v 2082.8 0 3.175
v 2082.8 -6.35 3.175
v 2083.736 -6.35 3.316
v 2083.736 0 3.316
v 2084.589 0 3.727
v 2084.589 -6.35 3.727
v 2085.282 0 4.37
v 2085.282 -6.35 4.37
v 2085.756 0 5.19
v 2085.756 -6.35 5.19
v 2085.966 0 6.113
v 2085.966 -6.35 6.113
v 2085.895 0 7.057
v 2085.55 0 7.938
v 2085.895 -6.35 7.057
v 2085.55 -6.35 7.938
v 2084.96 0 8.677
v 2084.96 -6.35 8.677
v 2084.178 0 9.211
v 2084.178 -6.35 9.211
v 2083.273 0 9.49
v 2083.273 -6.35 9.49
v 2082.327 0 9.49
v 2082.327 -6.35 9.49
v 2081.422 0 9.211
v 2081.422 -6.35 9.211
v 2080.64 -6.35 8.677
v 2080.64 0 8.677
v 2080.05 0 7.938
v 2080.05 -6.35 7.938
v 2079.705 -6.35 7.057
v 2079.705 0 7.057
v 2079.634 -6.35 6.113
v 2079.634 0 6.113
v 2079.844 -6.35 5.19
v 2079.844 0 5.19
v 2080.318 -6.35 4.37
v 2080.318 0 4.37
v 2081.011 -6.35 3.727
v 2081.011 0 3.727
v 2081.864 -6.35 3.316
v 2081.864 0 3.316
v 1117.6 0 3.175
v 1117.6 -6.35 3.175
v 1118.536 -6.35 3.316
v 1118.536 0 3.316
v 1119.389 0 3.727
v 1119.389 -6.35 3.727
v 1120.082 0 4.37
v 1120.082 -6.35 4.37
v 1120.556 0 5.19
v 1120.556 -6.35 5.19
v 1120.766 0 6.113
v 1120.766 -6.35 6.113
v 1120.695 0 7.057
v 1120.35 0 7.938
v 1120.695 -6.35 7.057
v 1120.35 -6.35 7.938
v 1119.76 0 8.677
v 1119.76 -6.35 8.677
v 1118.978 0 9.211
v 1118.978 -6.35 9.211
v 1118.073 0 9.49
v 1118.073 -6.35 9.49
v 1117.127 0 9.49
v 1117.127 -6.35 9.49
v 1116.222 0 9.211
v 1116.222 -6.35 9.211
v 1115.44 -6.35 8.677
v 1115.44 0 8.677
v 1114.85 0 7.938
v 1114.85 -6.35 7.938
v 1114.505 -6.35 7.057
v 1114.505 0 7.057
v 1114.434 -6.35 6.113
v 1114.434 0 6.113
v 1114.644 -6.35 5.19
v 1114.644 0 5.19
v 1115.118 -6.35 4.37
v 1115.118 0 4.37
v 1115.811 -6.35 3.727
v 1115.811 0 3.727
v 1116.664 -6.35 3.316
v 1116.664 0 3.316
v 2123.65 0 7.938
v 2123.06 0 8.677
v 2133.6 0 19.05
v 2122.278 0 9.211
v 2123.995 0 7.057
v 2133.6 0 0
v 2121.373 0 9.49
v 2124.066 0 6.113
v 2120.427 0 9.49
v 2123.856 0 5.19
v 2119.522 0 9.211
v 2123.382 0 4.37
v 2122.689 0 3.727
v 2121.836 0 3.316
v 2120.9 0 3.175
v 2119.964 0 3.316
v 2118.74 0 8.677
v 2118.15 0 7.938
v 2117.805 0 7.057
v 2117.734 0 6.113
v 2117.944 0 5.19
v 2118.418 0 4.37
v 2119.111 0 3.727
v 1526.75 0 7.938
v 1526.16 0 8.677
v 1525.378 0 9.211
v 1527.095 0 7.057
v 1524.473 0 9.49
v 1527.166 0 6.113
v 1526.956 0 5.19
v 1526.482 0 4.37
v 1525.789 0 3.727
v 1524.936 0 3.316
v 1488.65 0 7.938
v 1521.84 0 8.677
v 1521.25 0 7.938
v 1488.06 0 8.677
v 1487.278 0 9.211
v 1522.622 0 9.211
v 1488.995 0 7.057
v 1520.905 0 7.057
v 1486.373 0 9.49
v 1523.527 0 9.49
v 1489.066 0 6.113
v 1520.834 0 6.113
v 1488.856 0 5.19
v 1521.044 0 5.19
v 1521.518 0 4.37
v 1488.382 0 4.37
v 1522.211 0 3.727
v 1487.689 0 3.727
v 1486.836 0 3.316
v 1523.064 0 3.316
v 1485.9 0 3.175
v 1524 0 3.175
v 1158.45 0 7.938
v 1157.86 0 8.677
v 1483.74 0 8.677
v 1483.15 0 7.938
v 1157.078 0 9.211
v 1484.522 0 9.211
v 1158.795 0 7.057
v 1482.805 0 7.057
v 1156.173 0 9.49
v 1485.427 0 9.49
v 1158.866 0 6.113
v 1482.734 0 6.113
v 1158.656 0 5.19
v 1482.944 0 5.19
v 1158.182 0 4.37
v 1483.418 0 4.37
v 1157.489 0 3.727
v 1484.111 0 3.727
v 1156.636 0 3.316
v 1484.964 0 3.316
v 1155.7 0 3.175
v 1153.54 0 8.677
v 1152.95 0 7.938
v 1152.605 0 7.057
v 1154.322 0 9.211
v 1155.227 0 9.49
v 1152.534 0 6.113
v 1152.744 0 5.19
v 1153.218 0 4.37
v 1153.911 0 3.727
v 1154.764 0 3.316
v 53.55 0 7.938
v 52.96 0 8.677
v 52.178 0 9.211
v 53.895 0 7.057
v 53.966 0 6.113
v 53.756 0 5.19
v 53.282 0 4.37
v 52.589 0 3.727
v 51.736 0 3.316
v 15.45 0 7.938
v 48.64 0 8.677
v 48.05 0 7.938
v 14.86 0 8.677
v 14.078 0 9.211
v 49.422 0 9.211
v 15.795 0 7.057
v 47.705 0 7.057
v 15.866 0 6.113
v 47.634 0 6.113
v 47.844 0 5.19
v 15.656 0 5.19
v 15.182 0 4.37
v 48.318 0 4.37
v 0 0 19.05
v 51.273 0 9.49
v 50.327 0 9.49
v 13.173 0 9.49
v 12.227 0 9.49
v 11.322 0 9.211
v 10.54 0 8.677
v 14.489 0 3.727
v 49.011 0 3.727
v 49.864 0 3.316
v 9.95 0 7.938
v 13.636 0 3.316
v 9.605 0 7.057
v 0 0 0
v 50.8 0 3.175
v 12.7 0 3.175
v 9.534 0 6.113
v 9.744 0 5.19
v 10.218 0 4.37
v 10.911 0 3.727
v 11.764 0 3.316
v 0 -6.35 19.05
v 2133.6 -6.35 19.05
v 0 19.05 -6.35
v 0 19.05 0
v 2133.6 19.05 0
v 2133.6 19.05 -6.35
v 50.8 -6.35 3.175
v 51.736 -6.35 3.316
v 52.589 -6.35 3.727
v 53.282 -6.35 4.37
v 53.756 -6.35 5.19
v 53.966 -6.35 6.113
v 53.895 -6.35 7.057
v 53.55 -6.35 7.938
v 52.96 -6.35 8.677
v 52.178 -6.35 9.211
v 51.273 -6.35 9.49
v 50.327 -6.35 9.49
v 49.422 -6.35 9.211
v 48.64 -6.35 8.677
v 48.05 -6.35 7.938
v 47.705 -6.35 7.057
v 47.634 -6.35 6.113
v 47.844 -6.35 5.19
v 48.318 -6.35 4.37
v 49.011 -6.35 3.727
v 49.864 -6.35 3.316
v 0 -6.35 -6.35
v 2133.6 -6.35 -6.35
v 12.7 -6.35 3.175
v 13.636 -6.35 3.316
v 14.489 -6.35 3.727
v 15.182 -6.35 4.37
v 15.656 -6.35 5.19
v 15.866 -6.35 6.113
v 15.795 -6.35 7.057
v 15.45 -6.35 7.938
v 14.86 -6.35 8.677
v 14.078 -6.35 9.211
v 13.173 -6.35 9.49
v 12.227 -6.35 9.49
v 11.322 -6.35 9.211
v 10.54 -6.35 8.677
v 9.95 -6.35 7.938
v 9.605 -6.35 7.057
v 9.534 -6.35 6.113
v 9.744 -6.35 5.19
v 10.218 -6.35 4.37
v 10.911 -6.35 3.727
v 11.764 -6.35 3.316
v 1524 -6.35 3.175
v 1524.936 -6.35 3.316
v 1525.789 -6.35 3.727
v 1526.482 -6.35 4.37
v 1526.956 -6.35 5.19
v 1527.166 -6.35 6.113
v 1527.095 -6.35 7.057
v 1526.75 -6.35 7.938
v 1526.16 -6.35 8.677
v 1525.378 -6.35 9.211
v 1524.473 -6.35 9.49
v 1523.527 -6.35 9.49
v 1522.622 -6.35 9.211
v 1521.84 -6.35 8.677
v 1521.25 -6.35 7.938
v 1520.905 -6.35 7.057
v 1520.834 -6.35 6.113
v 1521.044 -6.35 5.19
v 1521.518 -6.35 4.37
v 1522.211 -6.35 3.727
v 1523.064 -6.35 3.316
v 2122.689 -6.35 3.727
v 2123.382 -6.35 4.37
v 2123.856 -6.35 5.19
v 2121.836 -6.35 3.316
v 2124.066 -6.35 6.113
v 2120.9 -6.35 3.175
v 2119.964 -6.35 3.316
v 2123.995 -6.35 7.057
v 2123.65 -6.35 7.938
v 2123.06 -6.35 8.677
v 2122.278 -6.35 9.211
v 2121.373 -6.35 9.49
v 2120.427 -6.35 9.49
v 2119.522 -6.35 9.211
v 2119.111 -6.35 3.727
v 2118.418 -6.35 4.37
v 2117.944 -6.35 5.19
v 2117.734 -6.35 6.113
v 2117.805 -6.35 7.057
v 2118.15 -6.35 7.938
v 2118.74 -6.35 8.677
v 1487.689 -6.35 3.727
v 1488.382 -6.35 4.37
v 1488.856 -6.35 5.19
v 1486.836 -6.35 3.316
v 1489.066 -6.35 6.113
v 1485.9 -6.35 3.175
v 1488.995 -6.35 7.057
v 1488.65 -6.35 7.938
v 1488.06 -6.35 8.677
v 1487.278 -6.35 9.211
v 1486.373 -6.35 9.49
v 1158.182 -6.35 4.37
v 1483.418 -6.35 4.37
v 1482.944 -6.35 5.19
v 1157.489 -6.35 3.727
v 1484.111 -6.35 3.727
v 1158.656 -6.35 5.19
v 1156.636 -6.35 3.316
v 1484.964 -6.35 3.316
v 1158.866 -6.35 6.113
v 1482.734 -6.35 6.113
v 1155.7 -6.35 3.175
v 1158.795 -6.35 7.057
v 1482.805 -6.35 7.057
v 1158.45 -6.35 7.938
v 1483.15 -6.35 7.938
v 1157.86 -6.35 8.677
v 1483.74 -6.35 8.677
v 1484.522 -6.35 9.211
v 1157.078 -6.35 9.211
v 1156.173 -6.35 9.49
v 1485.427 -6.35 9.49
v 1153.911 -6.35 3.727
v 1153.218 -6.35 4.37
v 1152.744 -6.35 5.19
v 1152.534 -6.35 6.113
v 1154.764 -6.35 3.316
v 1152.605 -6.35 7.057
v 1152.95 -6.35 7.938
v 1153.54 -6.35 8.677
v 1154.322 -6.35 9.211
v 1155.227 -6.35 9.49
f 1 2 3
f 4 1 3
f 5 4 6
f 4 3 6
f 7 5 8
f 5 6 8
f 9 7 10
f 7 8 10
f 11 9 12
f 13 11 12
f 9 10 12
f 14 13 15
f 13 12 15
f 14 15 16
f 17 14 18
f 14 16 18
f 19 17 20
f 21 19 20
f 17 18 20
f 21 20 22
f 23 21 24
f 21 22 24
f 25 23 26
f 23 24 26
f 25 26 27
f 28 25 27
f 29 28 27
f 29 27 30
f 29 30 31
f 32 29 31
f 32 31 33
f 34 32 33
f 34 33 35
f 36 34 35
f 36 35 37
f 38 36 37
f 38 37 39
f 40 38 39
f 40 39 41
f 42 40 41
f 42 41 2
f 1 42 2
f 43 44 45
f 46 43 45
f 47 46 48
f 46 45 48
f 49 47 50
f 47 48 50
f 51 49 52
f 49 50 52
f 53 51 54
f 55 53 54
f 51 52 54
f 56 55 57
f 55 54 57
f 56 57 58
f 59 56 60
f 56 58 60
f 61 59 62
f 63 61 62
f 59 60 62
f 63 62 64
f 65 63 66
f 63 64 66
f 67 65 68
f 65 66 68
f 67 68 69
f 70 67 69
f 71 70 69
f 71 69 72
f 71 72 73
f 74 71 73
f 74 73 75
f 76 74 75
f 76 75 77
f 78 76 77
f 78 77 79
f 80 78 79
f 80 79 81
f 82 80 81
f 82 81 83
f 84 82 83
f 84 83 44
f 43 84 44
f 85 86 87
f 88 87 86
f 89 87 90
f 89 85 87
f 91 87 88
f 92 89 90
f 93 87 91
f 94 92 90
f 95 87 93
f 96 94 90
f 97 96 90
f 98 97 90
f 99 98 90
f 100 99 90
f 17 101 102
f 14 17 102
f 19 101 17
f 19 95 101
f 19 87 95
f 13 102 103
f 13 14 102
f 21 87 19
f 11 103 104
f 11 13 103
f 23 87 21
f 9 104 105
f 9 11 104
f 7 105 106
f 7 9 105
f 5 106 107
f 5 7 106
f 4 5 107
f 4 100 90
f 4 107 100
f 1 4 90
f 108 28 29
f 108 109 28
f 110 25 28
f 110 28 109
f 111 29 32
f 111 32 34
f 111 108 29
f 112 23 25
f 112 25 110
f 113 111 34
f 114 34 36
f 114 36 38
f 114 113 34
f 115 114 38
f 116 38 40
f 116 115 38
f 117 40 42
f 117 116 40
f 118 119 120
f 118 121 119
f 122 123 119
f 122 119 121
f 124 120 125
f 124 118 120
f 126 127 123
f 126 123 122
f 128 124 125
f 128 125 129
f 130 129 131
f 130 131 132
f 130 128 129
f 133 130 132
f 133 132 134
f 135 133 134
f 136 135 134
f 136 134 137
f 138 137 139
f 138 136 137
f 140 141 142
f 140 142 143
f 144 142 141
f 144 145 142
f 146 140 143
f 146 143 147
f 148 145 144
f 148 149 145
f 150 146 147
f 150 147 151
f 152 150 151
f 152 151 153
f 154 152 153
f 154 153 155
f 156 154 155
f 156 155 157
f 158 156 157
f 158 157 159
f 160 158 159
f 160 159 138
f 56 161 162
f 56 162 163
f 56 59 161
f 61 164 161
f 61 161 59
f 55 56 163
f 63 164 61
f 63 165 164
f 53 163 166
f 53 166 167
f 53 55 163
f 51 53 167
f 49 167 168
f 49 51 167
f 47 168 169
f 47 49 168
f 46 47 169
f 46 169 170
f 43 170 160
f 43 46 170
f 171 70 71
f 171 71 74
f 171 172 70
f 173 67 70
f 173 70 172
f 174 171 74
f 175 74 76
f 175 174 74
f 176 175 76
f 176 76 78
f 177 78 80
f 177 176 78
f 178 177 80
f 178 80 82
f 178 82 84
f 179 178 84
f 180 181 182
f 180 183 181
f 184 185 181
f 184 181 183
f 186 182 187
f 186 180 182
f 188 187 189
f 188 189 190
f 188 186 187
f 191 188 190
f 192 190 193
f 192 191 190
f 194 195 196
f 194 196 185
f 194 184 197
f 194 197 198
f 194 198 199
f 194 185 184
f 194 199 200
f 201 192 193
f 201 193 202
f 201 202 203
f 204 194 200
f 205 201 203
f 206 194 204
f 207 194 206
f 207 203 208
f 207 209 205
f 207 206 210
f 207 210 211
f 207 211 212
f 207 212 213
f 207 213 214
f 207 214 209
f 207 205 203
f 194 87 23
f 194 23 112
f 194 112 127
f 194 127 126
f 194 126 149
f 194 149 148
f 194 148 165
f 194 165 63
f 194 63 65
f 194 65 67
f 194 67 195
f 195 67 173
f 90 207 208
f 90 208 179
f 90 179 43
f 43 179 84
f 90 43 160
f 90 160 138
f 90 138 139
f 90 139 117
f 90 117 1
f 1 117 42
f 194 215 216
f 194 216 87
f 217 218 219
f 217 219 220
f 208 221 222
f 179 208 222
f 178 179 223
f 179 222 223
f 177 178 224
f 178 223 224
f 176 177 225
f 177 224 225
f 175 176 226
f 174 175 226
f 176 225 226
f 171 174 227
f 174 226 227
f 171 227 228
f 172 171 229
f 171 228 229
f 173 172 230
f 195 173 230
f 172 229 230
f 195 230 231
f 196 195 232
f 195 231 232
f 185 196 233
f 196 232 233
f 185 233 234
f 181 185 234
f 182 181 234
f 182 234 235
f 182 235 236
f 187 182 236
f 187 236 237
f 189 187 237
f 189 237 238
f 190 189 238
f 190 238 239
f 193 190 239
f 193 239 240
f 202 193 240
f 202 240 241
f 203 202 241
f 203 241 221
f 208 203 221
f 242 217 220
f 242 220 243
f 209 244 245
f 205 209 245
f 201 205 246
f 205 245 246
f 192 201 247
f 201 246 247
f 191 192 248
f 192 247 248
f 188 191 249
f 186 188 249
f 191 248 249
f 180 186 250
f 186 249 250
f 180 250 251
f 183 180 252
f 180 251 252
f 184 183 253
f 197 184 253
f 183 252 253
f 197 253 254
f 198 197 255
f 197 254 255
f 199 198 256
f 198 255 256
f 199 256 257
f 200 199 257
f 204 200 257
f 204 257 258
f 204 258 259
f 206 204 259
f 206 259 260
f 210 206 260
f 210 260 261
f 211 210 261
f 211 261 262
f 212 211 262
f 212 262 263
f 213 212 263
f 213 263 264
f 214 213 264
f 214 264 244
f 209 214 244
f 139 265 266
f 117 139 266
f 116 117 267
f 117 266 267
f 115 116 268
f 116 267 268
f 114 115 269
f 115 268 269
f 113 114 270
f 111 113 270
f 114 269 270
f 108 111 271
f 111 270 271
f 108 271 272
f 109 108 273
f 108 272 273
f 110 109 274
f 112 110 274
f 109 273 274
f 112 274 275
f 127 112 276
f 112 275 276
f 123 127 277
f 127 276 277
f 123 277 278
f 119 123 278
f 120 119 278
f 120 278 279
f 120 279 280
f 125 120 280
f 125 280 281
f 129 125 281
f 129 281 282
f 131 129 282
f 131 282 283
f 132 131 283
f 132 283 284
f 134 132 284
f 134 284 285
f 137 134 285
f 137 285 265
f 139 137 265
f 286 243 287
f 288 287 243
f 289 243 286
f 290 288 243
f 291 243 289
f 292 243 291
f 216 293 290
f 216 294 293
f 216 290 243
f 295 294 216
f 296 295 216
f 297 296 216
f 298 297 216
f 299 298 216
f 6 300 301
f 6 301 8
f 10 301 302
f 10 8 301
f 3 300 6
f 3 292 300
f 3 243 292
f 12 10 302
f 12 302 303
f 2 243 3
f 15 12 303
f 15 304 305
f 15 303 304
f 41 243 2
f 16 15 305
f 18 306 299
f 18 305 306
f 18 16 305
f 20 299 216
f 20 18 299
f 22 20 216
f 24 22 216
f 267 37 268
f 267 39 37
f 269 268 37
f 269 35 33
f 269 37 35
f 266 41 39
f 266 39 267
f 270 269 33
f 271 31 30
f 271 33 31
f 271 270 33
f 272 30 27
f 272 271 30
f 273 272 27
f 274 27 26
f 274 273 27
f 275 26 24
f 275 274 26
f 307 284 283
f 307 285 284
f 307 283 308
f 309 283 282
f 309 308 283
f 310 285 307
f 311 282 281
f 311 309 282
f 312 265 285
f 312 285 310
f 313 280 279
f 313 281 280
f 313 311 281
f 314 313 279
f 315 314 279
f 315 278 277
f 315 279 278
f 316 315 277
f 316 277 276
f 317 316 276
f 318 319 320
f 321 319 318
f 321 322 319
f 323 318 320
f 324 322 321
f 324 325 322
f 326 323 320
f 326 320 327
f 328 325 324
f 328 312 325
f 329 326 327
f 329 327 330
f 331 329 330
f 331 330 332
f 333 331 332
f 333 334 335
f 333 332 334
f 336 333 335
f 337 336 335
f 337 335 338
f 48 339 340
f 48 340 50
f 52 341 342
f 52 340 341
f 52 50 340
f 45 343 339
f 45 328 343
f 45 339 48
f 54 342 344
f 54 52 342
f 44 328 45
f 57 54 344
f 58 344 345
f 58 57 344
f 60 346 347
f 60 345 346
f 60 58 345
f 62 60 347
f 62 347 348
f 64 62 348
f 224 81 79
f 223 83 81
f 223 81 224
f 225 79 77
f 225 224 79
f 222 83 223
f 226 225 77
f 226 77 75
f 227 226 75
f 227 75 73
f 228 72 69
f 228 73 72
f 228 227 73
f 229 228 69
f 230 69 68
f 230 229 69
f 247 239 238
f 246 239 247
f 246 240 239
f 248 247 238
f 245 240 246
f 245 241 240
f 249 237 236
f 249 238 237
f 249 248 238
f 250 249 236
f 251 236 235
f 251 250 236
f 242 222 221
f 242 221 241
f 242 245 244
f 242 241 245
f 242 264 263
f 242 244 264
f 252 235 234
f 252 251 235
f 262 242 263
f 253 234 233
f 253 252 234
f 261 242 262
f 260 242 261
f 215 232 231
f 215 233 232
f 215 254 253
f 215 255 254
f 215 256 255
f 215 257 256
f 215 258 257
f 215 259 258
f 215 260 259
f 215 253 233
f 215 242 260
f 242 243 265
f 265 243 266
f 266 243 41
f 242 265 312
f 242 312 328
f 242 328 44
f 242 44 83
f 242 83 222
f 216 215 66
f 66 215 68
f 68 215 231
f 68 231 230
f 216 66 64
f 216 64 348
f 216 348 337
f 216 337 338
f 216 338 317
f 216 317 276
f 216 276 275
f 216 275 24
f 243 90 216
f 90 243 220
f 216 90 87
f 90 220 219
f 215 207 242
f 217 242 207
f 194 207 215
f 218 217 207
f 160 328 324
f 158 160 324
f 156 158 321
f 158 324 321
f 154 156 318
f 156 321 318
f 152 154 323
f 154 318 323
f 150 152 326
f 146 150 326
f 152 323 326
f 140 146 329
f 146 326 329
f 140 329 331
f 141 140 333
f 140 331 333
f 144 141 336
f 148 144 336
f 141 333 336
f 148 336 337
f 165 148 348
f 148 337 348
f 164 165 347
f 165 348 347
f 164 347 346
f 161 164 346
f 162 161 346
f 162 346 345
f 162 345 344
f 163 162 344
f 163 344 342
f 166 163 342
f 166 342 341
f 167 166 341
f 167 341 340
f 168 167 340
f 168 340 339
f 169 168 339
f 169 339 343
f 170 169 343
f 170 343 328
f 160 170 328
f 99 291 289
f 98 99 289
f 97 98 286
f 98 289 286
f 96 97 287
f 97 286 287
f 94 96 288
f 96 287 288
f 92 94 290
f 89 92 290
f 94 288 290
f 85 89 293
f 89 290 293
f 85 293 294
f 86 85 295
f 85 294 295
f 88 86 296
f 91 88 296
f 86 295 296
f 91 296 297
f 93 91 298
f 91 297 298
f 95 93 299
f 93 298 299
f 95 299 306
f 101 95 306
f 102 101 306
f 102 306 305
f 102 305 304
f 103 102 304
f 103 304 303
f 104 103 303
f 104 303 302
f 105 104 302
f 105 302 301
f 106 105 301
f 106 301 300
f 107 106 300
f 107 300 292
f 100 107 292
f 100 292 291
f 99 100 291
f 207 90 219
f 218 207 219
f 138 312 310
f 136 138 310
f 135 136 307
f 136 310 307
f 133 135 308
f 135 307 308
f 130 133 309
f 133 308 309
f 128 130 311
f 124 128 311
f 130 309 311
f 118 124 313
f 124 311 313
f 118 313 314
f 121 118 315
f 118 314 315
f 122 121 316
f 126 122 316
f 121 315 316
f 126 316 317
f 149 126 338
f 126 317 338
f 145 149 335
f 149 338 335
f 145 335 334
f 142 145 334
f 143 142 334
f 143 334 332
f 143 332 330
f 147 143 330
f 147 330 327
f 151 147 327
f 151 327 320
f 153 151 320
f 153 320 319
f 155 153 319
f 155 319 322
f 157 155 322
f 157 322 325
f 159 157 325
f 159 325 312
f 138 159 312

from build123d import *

# Parameters (mm, degrees)
BOSS_EXTRUDE1_DEPTH = 2133.6
SKETCH2_R           = 3.175
CUT_EXTRUDE1_DEPTH  = 914.4


with BuildPart() as part:
    # Sketch1 → Boss-Extrude1 (new body)
    with BuildSketch(Plane(origin=(0, 0, 0), x_dir=(0, 0, -1), z_dir=(1, 0, 0))):
        Polygon((0, 0), (0, 19.05), (6.35, 19.05), (6.35, -6.35), (-19.05, -6.35), (-19.05, 0), align=None)
    extrude(amount=BOSS_EXTRUDE1_DEPTH)

    # Sketch2 → Cut-Extrude1 (cut)
    with BuildSketch(Plane.XZ.offset(6.35)):
        with Locations(Location((12.7, 6.35, 0), (0, 0, 270))):
            Circle(SKETCH2_R)
        with Locations(Location((50.8, 6.35, 0), (0, 0, 270))):
            Circle(SKETCH2_R)
        with Locations(Location((1117.6, 6.35, 0), (0, 0, 270))):
            Circle(SKETCH2_R)
        with Locations(Location((1155.7, 6.35, 0), (0, 0, 270))):
            Circle(SKETCH2_R)
        with Locations(Location((1485.9, 6.35, 0), (0, 0, 270))):
            Circle(SKETCH2_R)
        with Locations(Location((1524, 6.35, 0), (0, 0, 270))):
            Circle(SKETCH2_R)
        with Locations(Location((2082.8, 6.35, 0), (0, 0, 270))):
            Circle(SKETCH2_R)
        with Locations(Location((2120.9, 6.35, 0), (0, 0, 270))):
            Circle(SKETCH2_R)
    extrude(amount=-CUT_EXTRUDE1_DEPTH, mode=Mode.SUBTRACT)


solid = part.part
